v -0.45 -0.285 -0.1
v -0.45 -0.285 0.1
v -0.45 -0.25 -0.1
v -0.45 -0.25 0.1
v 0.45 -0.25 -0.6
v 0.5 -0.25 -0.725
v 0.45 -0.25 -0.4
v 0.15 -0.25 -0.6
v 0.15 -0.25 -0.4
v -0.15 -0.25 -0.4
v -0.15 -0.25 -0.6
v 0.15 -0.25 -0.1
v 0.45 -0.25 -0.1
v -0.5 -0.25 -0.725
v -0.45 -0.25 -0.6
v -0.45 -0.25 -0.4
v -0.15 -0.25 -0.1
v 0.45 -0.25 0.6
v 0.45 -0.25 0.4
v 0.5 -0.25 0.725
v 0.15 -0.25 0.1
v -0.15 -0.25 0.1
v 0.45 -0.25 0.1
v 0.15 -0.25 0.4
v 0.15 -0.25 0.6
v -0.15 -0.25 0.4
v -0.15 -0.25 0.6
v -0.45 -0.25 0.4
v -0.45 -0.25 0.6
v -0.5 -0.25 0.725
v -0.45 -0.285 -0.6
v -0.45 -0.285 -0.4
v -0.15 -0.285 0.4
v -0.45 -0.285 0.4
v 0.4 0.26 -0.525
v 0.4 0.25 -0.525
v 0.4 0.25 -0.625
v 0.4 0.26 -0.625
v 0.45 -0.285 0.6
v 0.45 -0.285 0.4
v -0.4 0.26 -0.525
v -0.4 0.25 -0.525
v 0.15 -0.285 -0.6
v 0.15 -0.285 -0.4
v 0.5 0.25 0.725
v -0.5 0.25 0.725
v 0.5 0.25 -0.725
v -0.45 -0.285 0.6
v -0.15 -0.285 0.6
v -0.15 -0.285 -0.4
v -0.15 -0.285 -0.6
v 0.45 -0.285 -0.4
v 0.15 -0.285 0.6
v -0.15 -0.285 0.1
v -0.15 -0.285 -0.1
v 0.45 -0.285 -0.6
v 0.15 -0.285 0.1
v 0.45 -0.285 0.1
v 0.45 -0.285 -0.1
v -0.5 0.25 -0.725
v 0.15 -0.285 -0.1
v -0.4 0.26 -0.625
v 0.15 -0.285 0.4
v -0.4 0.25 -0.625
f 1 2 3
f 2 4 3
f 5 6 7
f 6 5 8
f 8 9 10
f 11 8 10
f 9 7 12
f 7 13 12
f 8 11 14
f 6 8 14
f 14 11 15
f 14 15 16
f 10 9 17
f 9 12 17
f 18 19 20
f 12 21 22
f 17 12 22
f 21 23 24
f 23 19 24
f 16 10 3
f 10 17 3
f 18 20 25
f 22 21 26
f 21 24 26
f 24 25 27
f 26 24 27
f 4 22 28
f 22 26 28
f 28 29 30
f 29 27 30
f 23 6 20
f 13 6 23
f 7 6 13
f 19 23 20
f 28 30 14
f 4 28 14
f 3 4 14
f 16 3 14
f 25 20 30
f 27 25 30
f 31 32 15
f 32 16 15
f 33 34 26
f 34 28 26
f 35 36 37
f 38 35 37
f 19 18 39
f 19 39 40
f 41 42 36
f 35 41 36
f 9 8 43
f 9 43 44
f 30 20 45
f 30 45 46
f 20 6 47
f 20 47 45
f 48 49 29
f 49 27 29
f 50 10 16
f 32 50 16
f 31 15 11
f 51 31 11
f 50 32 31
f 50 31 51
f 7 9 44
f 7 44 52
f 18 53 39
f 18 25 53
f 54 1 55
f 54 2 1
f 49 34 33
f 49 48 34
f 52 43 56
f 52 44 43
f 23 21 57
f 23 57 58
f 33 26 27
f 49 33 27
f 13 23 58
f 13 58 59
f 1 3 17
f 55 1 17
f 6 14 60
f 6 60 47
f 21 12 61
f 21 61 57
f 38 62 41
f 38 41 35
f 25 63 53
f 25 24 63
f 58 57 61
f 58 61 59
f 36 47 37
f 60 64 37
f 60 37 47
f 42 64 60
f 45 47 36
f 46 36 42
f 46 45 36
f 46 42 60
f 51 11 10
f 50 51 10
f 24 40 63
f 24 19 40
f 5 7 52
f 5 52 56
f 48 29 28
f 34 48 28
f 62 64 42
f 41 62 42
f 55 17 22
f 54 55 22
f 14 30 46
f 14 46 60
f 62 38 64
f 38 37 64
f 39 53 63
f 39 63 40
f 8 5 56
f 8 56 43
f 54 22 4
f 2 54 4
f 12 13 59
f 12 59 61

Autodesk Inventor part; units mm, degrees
ref_plane "YZ Plane" through (0, 0, 0) normal (1, 0, 0) x (0, 1, 0)
ref_plane "XZ Plane" through (0, 0, 0) normal (0, 1, 0) x (-1, 0, 0)
ref_plane "XY Plane" through (0, 0, 0) normal (0, 0, 1) x (1, 0, 0)
sketch "Sketch1" plane through (0, 0, 0) normal (0, 1, 0) x (-1, 0, 0)
  line L0 (-0.5, 0.725) -> (0.5, 0.725)
  line L1 (0.5, 0.725) -> (0.5, -0.725)
  line L2 (0.5, -0.725) -> (-0.5, -0.725)
  line L3 (-0.5, -0.725) -> (-0.5, 0.725)
  line L4 (-0.5, 0.725) -> (0.5, -0.725) construction
  line L5 (0.5, 0.725) -> (-0.5, -0.725) construction
  point P0 (0, 0)
  dimension "d0" = 1
  dimension "d1" = 1.45
extrude "Extrusion1" add sketch "Sketch1" along normal mid plane 0.5
sketch "Sketch2" plane through (0, -0.25, 0) normal (0, -1, 0) x (1, 0, 0)
  line L0 (0.5, 0.725) -> (-0.5, 0.725) projected
  line L1 (-0.5, 0.725) -> (-0.5, -0.725) projected
  line L2 (-0.5, -0.725) -> (0.5, -0.725) projected
  line L3 (0.5, -0.725) -> (0.5, 0.725) projected
  line L4 (0.5, -0.725) -> (-0.5, -0.725) projected
  line L5 (0.5, 0.725) -> (0.5, -0.725) projected
  line L6 (0.45, -0.6) -> (0.15, -0.6)
  line L7 (0.15, -0.6) -> (0.15, -0.4)
  line L8 (0.15, -0.4) -> (0.45, -0.4)
  line L9 (0.45, -0.4) -> (0.45, -0.6)
  line L10 (-0.5, 0.725) -> (0.5, 0.725) projected
  line L11 (-0.5, -0.725) -> (-0.5, 0.725) projected
  line L12 (-0.45, -0.6) -> (-0.15, -0.6)
  line L13 (-0.15, -0.6) -> (-0.15, -0.4)
  line L14 (-0.15, -0.4) -> (-0.45, -0.4)
  line L15 (-0.45, -0.4) -> (-0.45, -0.6)
  line L16 (0.45, -0.1) -> (0.15, -0.1)
  line L17 (0.15, -0.1) -> (0.15, 0.1)
  line L18 (0.15, 0.1) -> (0.45, 0.1)
  line L19 (0.45, 0.1) -> (0.45, -0.1)
  line L20 (-0.45, -0.1) -> (-0.15, -0.1)
  line L21 (-0.45, 0.1) -> (-0.45, -0.1)
  line L22 (-0.15, 0.1) -> (-0.45, 0.1)
  line L23 (-0.15, -0.1) -> (-0.15, 0.1)
  line L24 (0.45, 0.4) -> (0.15, 0.4)
  line L25 (0.15, 0.4) -> (0.15, 0.6)
  line L26 (0.15, 0.6) -> (0.45, 0.6)
  line L27 (0.45, 0.6) -> (0.45, 0.4)
  line L28 (-0.45, 0.4) -> (-0.15, 0.4)
  line L29 (-0.45, 0.6) -> (-0.45, 0.4)
  line L30 (-0.15, 0.6) -> (-0.45, 0.6)
  line L31 (-0.15, 0.4) -> (-0.15, 0.6)
  point P0 (0, 0)
  point P1 (0.5, 0)
  dimension "d8" = 0.3
  dimension "d9" = 0.2
  dimension "d20" = 0.5
  dimension "d71" = 0.35
  dimension "d72" = 0.35
extrude "Extrusion2" add sketch "Sketch2" along normal blind 0.035 contours L6 L7 L8 L9 | L15 L14 L13 L12 | L16 L17 L18 L19 | L21 L22 L23 L20 | L24 L25 L26 L27 | L29 L30 L31 L28
sketch "Sketch5" plane through (0, 0.25, 0) normal (0, 1, 0) x (1, 0, 0)
  line L0 (-0.5, -0.725) -> (0.5, -0.725) projected
  line L1 (0.5, -0.725) -> (0.5, 0.725) projected
  line L2 (0.5, 0.725) -> (-0.5, 0.725) projected
  line L3 (-0.5, 0.725) -> (-0.5, -0.725) projected
  line L4 (-0.5, 0.725) -> (-0.5, -0.725) construction
  line L5 (0.4, 0.625) -> (-0.4, 0.625)
  line L6 (-0.4, 0.625) -> (-0.4, 0.525)
  line L7 (-0.4, 0.525) -> (0.4, 0.525)
  line L8 (0.4, 0.525) -> (0.4, 0.625)
  circle A0 centre (-0.4, 0.625) radius 0.1 construction
  point P0 (0, 0.525)
  point P1 (0, 0.725)
  dimension "d73" = 0.8
  dimension "d74" = 0.1
extrude "Extrusion5" add sketch "Sketch5" along normal blind 0.01 contours L8 L7 L6 L5
equation "\"d72\" = d71"
properties part number "Semiconductor_UDFN-6" material "ABS Plastic"
